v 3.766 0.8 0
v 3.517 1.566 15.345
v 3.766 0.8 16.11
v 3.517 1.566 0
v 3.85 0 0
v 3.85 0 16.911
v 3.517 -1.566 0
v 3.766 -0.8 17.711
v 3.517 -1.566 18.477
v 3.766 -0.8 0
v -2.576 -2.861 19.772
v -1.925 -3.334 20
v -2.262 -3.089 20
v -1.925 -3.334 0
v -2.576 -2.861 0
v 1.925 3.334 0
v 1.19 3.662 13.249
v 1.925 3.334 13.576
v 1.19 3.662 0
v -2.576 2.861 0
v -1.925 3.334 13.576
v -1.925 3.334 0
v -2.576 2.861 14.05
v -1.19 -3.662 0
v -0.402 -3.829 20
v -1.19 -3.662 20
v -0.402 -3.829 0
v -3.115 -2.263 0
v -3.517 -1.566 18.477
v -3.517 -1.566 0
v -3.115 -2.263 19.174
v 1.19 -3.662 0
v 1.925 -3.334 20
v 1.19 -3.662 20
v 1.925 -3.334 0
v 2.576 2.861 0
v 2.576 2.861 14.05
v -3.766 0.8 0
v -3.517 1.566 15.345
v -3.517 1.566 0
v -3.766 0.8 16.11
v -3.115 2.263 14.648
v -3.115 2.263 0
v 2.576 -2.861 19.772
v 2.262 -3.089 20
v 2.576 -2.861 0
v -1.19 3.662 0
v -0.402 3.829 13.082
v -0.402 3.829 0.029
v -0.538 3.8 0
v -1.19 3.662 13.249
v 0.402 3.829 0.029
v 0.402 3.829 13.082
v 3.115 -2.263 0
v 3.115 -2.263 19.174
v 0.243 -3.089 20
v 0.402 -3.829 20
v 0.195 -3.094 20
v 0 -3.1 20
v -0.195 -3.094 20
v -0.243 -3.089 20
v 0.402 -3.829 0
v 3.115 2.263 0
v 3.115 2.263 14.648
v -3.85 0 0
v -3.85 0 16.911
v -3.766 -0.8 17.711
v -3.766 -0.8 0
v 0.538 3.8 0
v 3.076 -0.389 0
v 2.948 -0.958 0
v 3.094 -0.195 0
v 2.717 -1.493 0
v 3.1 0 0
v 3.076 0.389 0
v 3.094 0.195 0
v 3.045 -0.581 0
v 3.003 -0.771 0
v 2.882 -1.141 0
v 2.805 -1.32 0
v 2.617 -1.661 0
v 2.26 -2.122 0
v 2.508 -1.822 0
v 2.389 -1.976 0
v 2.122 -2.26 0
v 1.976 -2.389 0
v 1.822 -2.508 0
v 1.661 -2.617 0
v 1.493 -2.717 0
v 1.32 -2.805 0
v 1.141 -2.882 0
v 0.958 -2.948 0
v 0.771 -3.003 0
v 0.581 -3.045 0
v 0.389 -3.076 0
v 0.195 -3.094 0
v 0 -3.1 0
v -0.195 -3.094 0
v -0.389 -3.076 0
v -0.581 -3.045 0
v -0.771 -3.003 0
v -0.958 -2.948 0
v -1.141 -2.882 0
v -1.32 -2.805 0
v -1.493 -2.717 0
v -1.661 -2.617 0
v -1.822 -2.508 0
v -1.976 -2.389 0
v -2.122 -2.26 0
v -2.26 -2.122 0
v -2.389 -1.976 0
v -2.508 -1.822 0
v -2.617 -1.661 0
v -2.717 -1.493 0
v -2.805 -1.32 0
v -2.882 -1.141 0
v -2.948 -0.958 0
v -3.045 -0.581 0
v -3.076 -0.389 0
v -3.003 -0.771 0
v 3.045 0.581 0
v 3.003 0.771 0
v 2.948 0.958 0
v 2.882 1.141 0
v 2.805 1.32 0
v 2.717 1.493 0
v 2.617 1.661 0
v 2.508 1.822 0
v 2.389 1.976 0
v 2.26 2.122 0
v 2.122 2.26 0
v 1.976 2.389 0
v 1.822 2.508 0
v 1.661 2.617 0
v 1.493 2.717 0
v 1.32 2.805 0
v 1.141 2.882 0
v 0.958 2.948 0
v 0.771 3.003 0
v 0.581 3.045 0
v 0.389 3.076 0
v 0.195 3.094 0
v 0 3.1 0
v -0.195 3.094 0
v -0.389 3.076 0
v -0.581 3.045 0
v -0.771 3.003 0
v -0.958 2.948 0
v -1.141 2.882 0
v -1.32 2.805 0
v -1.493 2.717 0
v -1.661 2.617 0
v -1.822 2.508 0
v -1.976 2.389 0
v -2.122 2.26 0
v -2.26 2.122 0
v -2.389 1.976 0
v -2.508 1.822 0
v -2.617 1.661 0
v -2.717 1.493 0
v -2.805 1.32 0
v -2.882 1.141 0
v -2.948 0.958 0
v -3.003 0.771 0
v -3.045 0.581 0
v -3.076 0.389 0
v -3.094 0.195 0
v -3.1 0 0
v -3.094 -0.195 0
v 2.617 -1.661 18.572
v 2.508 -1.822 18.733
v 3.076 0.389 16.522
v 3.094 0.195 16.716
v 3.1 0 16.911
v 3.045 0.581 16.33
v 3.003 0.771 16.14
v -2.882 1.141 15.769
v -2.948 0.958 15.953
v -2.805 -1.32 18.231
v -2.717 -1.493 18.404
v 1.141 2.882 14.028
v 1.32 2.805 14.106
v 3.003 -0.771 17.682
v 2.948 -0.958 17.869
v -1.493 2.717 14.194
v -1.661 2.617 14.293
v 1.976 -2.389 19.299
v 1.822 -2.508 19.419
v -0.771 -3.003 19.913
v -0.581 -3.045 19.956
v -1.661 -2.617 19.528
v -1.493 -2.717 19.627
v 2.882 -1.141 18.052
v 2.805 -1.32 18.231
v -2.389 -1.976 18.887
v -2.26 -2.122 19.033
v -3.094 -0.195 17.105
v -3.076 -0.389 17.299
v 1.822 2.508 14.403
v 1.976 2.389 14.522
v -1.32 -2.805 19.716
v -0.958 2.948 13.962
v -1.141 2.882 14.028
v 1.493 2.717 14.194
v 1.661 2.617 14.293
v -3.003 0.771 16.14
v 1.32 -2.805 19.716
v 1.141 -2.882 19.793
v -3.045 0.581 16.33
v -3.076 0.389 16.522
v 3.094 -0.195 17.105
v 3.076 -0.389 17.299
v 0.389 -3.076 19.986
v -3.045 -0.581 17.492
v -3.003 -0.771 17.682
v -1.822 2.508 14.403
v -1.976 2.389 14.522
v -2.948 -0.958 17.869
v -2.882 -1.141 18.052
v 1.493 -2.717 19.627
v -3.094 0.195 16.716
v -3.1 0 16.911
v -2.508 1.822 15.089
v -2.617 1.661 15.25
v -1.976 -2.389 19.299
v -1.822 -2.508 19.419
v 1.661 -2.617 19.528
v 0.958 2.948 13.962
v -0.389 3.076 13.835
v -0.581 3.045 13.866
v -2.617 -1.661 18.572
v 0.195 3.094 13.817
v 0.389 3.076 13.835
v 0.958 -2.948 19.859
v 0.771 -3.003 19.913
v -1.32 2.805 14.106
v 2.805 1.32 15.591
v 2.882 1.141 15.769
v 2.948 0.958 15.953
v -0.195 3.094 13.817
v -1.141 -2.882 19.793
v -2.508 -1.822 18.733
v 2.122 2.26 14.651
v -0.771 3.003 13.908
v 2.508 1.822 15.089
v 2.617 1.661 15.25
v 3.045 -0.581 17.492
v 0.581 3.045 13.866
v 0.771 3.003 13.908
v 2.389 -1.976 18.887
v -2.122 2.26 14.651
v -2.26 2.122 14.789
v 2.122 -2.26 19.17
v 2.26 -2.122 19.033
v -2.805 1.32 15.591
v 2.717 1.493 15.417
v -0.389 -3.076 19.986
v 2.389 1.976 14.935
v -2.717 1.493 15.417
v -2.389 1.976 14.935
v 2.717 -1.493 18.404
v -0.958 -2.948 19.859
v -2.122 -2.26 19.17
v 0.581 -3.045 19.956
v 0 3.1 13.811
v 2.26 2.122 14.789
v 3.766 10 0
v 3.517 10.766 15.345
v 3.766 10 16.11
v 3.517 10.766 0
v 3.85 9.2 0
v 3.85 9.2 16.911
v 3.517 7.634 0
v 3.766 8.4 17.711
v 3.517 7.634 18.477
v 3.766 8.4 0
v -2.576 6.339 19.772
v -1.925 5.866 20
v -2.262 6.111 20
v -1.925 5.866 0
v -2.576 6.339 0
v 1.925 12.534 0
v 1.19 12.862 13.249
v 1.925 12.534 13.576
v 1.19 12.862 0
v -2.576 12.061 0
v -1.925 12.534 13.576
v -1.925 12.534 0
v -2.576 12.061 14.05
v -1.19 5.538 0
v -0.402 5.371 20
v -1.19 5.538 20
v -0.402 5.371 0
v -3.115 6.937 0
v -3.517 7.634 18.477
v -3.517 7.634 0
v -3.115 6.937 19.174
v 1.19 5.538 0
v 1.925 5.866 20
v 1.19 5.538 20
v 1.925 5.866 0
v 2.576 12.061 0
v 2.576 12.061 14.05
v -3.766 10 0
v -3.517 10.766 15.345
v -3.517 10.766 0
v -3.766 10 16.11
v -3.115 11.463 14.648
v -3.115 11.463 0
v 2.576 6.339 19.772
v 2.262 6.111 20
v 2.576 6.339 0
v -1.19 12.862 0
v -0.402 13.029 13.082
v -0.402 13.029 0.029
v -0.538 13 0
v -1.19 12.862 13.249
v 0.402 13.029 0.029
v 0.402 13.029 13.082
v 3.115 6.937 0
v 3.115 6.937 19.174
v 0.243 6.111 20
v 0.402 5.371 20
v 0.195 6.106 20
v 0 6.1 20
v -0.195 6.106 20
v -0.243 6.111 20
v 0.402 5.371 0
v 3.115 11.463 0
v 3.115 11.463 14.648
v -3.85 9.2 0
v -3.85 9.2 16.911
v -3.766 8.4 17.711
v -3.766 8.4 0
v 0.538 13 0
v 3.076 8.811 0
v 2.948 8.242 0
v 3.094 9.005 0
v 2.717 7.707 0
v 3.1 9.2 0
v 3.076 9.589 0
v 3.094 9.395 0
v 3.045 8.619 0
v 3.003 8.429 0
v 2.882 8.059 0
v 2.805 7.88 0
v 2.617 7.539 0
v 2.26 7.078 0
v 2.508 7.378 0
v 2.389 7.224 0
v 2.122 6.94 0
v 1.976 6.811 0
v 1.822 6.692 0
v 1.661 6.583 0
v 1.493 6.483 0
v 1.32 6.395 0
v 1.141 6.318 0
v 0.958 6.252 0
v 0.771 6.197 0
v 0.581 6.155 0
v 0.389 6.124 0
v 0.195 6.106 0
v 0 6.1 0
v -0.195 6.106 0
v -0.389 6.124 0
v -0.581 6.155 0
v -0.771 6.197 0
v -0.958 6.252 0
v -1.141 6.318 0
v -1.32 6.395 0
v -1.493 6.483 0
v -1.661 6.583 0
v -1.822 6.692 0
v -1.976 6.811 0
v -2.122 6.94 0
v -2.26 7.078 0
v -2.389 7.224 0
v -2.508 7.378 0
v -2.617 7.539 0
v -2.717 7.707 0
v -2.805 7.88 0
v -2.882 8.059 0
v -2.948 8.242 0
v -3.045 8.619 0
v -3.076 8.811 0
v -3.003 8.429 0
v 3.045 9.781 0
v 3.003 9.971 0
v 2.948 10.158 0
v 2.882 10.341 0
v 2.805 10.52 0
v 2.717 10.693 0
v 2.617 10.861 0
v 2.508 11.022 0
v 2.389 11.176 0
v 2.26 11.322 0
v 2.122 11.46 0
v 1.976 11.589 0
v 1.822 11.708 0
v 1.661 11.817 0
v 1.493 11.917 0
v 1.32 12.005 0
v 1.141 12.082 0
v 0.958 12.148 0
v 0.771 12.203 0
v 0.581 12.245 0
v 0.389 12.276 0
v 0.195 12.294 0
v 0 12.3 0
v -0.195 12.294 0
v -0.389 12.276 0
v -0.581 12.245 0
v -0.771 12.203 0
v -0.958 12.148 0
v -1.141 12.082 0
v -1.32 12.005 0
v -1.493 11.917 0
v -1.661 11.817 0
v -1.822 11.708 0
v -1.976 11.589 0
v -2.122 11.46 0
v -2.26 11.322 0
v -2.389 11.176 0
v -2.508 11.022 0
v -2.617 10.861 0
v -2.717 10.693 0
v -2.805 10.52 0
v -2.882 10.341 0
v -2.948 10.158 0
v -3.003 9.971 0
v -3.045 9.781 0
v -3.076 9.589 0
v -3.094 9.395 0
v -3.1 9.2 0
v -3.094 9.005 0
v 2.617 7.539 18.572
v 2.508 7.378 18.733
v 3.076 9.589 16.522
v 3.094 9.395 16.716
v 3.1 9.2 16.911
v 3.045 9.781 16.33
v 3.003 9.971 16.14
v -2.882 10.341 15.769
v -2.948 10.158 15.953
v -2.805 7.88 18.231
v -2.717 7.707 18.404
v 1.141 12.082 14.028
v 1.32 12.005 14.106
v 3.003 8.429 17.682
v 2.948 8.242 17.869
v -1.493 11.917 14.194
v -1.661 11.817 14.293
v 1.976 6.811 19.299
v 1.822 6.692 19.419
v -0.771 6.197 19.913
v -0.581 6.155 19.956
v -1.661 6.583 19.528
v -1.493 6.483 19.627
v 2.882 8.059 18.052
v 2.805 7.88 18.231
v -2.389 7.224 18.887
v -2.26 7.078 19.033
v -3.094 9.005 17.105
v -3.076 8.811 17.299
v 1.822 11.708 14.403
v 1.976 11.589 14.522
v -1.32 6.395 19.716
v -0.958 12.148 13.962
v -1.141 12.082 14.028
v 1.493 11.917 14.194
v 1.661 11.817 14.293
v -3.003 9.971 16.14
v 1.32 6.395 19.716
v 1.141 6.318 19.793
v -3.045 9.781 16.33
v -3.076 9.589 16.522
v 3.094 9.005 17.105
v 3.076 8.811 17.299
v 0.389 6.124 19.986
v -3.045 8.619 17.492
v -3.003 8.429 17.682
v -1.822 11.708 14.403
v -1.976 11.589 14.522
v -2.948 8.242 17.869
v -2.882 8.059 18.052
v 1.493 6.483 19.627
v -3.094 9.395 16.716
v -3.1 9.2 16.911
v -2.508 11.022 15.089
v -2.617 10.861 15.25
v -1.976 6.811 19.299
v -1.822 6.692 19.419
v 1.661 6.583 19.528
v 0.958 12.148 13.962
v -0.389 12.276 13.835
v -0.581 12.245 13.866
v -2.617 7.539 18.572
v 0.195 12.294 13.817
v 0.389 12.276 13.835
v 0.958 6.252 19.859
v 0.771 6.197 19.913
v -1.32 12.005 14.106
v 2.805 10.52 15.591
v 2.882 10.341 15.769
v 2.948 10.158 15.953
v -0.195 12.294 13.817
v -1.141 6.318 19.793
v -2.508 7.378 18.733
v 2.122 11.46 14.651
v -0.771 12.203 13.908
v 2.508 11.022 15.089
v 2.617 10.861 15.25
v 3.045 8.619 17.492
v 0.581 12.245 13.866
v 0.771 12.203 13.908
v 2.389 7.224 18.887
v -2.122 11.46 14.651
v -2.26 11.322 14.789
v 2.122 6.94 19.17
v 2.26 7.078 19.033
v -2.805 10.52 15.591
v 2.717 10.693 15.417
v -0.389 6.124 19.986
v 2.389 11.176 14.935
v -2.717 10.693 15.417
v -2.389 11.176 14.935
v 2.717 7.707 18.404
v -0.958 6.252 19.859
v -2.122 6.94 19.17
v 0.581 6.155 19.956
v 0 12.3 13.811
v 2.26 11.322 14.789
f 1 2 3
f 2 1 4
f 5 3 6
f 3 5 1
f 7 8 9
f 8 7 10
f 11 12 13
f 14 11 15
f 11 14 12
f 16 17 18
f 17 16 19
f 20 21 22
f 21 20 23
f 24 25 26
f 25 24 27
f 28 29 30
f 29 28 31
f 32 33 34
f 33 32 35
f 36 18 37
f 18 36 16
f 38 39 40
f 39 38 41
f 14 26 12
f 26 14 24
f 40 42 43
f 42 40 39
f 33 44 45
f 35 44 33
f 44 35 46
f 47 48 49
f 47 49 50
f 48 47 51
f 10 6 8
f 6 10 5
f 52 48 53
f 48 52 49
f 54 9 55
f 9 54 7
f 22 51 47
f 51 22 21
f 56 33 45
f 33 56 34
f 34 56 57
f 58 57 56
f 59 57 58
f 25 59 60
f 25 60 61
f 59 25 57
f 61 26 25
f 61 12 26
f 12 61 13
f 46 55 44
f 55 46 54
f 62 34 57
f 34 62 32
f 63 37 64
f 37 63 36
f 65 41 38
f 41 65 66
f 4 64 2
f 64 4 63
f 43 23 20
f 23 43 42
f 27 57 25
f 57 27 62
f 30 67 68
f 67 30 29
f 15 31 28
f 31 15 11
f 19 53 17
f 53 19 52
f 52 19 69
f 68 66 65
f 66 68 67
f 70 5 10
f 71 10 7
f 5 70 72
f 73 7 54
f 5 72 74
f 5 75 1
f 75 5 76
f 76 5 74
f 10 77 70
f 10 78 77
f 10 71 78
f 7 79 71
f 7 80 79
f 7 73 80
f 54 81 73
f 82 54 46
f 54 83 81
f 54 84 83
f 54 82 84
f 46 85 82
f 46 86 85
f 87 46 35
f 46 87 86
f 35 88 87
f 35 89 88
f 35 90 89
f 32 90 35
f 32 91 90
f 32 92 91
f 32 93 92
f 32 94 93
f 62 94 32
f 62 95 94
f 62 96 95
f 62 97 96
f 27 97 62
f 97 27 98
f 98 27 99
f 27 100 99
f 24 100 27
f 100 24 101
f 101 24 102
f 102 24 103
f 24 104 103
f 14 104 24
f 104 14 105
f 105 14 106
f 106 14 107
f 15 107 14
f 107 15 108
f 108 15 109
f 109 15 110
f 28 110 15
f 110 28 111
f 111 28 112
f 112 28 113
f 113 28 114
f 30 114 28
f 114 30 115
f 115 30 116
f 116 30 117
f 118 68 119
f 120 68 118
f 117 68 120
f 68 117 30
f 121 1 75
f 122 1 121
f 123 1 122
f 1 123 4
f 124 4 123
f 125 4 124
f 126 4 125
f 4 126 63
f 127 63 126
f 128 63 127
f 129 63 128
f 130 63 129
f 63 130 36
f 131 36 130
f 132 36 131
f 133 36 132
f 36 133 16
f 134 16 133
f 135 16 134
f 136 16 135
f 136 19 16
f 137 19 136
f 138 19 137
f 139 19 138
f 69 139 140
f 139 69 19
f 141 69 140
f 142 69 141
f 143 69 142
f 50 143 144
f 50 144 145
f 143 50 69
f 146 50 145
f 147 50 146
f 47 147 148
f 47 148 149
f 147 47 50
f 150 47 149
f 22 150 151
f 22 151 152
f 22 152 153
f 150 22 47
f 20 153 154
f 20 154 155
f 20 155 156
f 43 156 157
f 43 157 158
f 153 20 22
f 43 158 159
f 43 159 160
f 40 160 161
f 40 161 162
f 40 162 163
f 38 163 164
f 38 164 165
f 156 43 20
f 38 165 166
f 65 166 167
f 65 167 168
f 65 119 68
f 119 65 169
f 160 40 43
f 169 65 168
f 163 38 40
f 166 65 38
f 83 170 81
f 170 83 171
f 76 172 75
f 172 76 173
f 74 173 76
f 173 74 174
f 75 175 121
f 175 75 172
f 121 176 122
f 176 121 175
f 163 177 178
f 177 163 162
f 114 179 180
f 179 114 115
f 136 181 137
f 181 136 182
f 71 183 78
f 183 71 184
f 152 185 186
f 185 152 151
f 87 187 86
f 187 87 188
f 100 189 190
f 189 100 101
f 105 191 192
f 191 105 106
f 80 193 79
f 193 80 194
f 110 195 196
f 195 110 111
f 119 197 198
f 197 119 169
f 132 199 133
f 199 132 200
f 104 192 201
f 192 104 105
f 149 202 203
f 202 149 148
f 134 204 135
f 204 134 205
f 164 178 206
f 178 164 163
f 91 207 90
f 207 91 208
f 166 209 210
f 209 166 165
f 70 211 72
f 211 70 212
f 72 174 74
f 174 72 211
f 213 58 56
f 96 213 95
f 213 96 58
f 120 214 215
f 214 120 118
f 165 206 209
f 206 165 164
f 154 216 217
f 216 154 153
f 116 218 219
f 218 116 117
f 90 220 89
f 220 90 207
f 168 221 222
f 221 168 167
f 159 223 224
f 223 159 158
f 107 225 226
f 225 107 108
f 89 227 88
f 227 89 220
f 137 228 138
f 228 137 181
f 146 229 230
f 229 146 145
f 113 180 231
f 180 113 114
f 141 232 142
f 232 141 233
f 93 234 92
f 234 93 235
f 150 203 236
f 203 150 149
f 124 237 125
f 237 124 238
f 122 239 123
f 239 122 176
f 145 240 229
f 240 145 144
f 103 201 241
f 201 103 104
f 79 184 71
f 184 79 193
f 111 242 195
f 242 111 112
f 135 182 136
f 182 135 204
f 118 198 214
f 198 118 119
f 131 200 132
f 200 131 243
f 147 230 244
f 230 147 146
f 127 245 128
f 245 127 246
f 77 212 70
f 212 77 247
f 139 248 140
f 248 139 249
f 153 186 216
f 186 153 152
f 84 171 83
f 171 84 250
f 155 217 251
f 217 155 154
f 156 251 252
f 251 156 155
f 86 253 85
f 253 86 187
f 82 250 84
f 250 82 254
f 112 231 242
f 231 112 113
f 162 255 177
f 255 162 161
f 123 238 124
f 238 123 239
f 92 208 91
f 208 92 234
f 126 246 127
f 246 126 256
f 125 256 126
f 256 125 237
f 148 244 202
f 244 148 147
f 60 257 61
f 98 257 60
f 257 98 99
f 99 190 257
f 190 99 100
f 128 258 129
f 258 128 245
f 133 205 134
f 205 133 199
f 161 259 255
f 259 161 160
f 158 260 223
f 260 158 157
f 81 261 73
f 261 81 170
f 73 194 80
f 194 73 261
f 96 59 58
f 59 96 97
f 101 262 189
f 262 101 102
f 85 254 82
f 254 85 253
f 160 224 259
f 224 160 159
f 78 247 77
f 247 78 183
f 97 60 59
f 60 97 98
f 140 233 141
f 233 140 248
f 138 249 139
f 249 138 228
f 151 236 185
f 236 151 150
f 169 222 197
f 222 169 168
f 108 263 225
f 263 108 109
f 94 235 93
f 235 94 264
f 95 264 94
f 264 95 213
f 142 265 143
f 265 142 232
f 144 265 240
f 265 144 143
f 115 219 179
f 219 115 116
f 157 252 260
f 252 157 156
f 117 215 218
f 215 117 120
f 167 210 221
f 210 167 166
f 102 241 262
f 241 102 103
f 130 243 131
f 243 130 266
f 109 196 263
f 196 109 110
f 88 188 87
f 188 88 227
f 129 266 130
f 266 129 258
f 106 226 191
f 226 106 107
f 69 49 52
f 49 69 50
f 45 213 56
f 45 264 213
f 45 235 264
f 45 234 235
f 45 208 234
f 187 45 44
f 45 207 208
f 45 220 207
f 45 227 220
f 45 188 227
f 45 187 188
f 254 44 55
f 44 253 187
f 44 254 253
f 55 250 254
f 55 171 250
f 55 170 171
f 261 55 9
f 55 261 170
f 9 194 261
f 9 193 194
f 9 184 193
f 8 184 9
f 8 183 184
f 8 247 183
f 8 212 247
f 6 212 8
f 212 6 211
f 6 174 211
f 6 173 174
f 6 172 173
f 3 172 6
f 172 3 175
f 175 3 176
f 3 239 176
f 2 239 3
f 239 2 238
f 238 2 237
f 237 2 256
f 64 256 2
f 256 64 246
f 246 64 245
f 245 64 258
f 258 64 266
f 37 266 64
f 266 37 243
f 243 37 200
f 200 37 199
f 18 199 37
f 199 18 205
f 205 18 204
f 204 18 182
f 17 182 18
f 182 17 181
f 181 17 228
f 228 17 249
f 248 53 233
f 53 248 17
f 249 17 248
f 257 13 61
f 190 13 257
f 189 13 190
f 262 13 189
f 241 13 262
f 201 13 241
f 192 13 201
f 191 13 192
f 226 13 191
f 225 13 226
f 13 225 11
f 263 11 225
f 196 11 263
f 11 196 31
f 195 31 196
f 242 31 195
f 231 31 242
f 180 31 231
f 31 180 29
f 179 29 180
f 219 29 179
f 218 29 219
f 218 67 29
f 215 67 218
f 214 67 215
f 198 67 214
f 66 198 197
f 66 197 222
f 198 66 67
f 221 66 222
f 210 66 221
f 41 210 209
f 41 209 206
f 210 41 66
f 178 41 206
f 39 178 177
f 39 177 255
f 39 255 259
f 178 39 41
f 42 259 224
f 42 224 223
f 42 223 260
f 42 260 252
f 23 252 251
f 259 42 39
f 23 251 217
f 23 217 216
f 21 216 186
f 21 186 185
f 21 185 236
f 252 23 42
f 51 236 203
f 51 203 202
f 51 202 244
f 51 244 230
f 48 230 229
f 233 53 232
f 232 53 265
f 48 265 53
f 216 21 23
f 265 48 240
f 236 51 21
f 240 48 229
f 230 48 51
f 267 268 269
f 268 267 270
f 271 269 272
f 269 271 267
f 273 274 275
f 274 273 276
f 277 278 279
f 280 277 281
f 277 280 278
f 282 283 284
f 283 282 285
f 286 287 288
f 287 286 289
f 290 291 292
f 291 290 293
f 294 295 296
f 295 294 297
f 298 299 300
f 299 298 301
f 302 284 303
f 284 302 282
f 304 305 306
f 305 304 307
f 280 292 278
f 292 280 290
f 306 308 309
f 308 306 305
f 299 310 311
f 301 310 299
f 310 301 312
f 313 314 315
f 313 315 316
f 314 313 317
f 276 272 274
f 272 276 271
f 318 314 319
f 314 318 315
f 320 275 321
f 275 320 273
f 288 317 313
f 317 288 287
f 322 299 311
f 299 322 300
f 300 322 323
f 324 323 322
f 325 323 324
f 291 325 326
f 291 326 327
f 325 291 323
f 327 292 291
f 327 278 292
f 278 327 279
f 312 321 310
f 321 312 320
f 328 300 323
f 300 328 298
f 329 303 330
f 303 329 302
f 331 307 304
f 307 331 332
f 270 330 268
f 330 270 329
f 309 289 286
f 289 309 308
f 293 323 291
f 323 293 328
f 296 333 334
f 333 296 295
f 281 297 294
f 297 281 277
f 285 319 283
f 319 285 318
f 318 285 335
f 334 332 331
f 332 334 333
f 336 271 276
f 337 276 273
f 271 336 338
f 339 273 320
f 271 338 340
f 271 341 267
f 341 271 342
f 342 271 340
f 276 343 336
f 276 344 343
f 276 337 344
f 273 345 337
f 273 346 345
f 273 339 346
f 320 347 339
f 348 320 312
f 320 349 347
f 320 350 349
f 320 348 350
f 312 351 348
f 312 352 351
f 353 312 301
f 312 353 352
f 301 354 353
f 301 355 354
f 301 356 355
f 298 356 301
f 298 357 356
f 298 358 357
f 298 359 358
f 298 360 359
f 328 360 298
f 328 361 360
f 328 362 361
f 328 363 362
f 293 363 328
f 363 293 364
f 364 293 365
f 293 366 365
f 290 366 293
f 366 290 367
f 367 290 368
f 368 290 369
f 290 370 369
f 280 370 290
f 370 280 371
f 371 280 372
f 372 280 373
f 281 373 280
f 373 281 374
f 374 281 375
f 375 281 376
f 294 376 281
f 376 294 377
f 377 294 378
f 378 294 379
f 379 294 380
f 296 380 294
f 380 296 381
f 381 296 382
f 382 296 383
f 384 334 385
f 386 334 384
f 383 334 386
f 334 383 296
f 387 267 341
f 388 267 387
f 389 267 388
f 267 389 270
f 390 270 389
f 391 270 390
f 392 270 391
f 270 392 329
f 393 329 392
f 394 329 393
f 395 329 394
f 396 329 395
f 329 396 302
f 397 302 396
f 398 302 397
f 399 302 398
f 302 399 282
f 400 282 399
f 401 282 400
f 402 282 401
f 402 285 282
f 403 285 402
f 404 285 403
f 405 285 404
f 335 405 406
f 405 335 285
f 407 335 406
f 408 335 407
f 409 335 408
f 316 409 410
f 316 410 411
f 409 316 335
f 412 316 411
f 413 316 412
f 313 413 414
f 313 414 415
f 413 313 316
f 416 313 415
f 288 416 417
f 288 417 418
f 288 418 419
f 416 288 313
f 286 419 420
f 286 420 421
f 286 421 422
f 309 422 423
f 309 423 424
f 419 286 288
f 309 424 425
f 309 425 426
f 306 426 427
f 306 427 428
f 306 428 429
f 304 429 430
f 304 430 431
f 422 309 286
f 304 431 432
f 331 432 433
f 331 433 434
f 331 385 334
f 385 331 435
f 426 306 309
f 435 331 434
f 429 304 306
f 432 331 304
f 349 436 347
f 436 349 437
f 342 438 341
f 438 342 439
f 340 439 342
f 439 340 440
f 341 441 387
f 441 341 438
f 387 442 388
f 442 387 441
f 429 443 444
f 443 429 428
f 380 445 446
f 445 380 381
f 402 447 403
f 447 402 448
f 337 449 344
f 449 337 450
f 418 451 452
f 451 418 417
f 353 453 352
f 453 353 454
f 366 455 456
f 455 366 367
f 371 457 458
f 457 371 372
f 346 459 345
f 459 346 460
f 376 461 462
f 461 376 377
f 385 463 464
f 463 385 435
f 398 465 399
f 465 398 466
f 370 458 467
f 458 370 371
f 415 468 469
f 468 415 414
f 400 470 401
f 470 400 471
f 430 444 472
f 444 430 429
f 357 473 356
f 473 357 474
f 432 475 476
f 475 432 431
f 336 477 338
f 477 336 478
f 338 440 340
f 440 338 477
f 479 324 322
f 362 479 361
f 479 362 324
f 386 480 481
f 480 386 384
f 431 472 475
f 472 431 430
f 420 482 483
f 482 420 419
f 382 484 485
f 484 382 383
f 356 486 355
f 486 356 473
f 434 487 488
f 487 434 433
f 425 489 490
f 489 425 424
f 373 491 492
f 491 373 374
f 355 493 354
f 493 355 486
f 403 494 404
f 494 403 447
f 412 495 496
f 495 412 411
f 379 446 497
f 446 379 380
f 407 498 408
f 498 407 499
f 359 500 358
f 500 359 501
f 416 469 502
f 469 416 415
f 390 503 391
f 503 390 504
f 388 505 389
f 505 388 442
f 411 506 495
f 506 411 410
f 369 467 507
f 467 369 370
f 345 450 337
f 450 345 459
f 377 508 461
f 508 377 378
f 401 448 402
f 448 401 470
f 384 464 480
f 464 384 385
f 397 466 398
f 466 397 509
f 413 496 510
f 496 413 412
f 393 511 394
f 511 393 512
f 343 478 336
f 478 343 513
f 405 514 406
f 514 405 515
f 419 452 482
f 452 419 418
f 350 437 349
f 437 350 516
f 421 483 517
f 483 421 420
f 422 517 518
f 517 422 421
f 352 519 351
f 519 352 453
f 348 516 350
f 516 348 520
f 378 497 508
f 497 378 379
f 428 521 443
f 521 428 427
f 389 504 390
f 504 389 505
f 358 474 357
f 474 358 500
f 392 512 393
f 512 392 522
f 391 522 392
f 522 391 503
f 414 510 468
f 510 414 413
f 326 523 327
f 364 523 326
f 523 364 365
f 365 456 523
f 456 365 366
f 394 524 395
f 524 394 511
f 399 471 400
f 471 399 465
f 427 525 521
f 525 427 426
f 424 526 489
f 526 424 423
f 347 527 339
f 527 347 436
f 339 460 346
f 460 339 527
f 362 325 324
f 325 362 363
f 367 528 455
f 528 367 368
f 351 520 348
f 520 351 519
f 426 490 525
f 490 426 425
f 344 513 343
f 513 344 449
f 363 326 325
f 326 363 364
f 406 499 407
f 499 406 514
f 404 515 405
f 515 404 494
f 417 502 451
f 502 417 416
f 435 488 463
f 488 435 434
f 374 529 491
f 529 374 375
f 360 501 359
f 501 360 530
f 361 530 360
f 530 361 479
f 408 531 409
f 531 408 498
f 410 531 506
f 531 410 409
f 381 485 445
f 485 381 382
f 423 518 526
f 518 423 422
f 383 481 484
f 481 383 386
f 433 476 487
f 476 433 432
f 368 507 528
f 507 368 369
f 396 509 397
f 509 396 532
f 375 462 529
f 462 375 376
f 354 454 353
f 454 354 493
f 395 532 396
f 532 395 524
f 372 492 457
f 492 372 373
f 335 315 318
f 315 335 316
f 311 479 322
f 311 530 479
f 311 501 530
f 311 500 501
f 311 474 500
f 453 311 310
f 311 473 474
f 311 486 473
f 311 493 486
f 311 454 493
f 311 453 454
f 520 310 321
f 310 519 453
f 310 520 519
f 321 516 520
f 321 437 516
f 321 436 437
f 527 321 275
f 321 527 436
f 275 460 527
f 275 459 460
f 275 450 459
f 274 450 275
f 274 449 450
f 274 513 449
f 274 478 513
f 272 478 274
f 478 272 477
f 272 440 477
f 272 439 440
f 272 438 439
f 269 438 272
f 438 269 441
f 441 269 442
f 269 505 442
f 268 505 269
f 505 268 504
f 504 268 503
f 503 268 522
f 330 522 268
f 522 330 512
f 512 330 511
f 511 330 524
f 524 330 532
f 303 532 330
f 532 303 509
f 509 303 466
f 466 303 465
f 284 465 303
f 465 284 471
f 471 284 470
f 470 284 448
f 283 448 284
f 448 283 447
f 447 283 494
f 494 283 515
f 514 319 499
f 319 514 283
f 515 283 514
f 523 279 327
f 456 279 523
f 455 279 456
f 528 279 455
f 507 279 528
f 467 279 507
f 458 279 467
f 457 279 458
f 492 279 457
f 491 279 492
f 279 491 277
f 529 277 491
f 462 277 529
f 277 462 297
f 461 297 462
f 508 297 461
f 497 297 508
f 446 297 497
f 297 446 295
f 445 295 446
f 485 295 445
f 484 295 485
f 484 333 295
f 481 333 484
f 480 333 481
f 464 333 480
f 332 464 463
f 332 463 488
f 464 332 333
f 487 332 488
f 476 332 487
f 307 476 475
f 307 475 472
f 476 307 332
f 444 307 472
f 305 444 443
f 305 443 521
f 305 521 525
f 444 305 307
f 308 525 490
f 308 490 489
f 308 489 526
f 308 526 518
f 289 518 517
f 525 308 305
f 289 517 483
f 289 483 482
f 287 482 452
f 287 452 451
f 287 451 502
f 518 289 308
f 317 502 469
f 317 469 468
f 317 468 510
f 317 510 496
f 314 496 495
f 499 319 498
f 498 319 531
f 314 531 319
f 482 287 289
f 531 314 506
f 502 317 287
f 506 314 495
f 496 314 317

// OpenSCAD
eps = 0.01;
rod_d = 5+1.2;

module rod_guide()
{
  intersection()
  {
    // main block
    difference()
    {
      cylinder(d=rod_d+1.5, h=20, $fn=30);
      translate([0, 0, -eps])
        cylinder(d=rod_d, h=20+2*eps, $fn=100);
    }
    // cut at the top, to minimize drag
    translate([-50/2, -50/2, -30+1.2])
      rotate([45, 0, 0])
    cube([50, 50, 50]);
  }
}


for(i=[0:1])
  translate([0, i*(rod_d+3), 0])
    rod_guide();
